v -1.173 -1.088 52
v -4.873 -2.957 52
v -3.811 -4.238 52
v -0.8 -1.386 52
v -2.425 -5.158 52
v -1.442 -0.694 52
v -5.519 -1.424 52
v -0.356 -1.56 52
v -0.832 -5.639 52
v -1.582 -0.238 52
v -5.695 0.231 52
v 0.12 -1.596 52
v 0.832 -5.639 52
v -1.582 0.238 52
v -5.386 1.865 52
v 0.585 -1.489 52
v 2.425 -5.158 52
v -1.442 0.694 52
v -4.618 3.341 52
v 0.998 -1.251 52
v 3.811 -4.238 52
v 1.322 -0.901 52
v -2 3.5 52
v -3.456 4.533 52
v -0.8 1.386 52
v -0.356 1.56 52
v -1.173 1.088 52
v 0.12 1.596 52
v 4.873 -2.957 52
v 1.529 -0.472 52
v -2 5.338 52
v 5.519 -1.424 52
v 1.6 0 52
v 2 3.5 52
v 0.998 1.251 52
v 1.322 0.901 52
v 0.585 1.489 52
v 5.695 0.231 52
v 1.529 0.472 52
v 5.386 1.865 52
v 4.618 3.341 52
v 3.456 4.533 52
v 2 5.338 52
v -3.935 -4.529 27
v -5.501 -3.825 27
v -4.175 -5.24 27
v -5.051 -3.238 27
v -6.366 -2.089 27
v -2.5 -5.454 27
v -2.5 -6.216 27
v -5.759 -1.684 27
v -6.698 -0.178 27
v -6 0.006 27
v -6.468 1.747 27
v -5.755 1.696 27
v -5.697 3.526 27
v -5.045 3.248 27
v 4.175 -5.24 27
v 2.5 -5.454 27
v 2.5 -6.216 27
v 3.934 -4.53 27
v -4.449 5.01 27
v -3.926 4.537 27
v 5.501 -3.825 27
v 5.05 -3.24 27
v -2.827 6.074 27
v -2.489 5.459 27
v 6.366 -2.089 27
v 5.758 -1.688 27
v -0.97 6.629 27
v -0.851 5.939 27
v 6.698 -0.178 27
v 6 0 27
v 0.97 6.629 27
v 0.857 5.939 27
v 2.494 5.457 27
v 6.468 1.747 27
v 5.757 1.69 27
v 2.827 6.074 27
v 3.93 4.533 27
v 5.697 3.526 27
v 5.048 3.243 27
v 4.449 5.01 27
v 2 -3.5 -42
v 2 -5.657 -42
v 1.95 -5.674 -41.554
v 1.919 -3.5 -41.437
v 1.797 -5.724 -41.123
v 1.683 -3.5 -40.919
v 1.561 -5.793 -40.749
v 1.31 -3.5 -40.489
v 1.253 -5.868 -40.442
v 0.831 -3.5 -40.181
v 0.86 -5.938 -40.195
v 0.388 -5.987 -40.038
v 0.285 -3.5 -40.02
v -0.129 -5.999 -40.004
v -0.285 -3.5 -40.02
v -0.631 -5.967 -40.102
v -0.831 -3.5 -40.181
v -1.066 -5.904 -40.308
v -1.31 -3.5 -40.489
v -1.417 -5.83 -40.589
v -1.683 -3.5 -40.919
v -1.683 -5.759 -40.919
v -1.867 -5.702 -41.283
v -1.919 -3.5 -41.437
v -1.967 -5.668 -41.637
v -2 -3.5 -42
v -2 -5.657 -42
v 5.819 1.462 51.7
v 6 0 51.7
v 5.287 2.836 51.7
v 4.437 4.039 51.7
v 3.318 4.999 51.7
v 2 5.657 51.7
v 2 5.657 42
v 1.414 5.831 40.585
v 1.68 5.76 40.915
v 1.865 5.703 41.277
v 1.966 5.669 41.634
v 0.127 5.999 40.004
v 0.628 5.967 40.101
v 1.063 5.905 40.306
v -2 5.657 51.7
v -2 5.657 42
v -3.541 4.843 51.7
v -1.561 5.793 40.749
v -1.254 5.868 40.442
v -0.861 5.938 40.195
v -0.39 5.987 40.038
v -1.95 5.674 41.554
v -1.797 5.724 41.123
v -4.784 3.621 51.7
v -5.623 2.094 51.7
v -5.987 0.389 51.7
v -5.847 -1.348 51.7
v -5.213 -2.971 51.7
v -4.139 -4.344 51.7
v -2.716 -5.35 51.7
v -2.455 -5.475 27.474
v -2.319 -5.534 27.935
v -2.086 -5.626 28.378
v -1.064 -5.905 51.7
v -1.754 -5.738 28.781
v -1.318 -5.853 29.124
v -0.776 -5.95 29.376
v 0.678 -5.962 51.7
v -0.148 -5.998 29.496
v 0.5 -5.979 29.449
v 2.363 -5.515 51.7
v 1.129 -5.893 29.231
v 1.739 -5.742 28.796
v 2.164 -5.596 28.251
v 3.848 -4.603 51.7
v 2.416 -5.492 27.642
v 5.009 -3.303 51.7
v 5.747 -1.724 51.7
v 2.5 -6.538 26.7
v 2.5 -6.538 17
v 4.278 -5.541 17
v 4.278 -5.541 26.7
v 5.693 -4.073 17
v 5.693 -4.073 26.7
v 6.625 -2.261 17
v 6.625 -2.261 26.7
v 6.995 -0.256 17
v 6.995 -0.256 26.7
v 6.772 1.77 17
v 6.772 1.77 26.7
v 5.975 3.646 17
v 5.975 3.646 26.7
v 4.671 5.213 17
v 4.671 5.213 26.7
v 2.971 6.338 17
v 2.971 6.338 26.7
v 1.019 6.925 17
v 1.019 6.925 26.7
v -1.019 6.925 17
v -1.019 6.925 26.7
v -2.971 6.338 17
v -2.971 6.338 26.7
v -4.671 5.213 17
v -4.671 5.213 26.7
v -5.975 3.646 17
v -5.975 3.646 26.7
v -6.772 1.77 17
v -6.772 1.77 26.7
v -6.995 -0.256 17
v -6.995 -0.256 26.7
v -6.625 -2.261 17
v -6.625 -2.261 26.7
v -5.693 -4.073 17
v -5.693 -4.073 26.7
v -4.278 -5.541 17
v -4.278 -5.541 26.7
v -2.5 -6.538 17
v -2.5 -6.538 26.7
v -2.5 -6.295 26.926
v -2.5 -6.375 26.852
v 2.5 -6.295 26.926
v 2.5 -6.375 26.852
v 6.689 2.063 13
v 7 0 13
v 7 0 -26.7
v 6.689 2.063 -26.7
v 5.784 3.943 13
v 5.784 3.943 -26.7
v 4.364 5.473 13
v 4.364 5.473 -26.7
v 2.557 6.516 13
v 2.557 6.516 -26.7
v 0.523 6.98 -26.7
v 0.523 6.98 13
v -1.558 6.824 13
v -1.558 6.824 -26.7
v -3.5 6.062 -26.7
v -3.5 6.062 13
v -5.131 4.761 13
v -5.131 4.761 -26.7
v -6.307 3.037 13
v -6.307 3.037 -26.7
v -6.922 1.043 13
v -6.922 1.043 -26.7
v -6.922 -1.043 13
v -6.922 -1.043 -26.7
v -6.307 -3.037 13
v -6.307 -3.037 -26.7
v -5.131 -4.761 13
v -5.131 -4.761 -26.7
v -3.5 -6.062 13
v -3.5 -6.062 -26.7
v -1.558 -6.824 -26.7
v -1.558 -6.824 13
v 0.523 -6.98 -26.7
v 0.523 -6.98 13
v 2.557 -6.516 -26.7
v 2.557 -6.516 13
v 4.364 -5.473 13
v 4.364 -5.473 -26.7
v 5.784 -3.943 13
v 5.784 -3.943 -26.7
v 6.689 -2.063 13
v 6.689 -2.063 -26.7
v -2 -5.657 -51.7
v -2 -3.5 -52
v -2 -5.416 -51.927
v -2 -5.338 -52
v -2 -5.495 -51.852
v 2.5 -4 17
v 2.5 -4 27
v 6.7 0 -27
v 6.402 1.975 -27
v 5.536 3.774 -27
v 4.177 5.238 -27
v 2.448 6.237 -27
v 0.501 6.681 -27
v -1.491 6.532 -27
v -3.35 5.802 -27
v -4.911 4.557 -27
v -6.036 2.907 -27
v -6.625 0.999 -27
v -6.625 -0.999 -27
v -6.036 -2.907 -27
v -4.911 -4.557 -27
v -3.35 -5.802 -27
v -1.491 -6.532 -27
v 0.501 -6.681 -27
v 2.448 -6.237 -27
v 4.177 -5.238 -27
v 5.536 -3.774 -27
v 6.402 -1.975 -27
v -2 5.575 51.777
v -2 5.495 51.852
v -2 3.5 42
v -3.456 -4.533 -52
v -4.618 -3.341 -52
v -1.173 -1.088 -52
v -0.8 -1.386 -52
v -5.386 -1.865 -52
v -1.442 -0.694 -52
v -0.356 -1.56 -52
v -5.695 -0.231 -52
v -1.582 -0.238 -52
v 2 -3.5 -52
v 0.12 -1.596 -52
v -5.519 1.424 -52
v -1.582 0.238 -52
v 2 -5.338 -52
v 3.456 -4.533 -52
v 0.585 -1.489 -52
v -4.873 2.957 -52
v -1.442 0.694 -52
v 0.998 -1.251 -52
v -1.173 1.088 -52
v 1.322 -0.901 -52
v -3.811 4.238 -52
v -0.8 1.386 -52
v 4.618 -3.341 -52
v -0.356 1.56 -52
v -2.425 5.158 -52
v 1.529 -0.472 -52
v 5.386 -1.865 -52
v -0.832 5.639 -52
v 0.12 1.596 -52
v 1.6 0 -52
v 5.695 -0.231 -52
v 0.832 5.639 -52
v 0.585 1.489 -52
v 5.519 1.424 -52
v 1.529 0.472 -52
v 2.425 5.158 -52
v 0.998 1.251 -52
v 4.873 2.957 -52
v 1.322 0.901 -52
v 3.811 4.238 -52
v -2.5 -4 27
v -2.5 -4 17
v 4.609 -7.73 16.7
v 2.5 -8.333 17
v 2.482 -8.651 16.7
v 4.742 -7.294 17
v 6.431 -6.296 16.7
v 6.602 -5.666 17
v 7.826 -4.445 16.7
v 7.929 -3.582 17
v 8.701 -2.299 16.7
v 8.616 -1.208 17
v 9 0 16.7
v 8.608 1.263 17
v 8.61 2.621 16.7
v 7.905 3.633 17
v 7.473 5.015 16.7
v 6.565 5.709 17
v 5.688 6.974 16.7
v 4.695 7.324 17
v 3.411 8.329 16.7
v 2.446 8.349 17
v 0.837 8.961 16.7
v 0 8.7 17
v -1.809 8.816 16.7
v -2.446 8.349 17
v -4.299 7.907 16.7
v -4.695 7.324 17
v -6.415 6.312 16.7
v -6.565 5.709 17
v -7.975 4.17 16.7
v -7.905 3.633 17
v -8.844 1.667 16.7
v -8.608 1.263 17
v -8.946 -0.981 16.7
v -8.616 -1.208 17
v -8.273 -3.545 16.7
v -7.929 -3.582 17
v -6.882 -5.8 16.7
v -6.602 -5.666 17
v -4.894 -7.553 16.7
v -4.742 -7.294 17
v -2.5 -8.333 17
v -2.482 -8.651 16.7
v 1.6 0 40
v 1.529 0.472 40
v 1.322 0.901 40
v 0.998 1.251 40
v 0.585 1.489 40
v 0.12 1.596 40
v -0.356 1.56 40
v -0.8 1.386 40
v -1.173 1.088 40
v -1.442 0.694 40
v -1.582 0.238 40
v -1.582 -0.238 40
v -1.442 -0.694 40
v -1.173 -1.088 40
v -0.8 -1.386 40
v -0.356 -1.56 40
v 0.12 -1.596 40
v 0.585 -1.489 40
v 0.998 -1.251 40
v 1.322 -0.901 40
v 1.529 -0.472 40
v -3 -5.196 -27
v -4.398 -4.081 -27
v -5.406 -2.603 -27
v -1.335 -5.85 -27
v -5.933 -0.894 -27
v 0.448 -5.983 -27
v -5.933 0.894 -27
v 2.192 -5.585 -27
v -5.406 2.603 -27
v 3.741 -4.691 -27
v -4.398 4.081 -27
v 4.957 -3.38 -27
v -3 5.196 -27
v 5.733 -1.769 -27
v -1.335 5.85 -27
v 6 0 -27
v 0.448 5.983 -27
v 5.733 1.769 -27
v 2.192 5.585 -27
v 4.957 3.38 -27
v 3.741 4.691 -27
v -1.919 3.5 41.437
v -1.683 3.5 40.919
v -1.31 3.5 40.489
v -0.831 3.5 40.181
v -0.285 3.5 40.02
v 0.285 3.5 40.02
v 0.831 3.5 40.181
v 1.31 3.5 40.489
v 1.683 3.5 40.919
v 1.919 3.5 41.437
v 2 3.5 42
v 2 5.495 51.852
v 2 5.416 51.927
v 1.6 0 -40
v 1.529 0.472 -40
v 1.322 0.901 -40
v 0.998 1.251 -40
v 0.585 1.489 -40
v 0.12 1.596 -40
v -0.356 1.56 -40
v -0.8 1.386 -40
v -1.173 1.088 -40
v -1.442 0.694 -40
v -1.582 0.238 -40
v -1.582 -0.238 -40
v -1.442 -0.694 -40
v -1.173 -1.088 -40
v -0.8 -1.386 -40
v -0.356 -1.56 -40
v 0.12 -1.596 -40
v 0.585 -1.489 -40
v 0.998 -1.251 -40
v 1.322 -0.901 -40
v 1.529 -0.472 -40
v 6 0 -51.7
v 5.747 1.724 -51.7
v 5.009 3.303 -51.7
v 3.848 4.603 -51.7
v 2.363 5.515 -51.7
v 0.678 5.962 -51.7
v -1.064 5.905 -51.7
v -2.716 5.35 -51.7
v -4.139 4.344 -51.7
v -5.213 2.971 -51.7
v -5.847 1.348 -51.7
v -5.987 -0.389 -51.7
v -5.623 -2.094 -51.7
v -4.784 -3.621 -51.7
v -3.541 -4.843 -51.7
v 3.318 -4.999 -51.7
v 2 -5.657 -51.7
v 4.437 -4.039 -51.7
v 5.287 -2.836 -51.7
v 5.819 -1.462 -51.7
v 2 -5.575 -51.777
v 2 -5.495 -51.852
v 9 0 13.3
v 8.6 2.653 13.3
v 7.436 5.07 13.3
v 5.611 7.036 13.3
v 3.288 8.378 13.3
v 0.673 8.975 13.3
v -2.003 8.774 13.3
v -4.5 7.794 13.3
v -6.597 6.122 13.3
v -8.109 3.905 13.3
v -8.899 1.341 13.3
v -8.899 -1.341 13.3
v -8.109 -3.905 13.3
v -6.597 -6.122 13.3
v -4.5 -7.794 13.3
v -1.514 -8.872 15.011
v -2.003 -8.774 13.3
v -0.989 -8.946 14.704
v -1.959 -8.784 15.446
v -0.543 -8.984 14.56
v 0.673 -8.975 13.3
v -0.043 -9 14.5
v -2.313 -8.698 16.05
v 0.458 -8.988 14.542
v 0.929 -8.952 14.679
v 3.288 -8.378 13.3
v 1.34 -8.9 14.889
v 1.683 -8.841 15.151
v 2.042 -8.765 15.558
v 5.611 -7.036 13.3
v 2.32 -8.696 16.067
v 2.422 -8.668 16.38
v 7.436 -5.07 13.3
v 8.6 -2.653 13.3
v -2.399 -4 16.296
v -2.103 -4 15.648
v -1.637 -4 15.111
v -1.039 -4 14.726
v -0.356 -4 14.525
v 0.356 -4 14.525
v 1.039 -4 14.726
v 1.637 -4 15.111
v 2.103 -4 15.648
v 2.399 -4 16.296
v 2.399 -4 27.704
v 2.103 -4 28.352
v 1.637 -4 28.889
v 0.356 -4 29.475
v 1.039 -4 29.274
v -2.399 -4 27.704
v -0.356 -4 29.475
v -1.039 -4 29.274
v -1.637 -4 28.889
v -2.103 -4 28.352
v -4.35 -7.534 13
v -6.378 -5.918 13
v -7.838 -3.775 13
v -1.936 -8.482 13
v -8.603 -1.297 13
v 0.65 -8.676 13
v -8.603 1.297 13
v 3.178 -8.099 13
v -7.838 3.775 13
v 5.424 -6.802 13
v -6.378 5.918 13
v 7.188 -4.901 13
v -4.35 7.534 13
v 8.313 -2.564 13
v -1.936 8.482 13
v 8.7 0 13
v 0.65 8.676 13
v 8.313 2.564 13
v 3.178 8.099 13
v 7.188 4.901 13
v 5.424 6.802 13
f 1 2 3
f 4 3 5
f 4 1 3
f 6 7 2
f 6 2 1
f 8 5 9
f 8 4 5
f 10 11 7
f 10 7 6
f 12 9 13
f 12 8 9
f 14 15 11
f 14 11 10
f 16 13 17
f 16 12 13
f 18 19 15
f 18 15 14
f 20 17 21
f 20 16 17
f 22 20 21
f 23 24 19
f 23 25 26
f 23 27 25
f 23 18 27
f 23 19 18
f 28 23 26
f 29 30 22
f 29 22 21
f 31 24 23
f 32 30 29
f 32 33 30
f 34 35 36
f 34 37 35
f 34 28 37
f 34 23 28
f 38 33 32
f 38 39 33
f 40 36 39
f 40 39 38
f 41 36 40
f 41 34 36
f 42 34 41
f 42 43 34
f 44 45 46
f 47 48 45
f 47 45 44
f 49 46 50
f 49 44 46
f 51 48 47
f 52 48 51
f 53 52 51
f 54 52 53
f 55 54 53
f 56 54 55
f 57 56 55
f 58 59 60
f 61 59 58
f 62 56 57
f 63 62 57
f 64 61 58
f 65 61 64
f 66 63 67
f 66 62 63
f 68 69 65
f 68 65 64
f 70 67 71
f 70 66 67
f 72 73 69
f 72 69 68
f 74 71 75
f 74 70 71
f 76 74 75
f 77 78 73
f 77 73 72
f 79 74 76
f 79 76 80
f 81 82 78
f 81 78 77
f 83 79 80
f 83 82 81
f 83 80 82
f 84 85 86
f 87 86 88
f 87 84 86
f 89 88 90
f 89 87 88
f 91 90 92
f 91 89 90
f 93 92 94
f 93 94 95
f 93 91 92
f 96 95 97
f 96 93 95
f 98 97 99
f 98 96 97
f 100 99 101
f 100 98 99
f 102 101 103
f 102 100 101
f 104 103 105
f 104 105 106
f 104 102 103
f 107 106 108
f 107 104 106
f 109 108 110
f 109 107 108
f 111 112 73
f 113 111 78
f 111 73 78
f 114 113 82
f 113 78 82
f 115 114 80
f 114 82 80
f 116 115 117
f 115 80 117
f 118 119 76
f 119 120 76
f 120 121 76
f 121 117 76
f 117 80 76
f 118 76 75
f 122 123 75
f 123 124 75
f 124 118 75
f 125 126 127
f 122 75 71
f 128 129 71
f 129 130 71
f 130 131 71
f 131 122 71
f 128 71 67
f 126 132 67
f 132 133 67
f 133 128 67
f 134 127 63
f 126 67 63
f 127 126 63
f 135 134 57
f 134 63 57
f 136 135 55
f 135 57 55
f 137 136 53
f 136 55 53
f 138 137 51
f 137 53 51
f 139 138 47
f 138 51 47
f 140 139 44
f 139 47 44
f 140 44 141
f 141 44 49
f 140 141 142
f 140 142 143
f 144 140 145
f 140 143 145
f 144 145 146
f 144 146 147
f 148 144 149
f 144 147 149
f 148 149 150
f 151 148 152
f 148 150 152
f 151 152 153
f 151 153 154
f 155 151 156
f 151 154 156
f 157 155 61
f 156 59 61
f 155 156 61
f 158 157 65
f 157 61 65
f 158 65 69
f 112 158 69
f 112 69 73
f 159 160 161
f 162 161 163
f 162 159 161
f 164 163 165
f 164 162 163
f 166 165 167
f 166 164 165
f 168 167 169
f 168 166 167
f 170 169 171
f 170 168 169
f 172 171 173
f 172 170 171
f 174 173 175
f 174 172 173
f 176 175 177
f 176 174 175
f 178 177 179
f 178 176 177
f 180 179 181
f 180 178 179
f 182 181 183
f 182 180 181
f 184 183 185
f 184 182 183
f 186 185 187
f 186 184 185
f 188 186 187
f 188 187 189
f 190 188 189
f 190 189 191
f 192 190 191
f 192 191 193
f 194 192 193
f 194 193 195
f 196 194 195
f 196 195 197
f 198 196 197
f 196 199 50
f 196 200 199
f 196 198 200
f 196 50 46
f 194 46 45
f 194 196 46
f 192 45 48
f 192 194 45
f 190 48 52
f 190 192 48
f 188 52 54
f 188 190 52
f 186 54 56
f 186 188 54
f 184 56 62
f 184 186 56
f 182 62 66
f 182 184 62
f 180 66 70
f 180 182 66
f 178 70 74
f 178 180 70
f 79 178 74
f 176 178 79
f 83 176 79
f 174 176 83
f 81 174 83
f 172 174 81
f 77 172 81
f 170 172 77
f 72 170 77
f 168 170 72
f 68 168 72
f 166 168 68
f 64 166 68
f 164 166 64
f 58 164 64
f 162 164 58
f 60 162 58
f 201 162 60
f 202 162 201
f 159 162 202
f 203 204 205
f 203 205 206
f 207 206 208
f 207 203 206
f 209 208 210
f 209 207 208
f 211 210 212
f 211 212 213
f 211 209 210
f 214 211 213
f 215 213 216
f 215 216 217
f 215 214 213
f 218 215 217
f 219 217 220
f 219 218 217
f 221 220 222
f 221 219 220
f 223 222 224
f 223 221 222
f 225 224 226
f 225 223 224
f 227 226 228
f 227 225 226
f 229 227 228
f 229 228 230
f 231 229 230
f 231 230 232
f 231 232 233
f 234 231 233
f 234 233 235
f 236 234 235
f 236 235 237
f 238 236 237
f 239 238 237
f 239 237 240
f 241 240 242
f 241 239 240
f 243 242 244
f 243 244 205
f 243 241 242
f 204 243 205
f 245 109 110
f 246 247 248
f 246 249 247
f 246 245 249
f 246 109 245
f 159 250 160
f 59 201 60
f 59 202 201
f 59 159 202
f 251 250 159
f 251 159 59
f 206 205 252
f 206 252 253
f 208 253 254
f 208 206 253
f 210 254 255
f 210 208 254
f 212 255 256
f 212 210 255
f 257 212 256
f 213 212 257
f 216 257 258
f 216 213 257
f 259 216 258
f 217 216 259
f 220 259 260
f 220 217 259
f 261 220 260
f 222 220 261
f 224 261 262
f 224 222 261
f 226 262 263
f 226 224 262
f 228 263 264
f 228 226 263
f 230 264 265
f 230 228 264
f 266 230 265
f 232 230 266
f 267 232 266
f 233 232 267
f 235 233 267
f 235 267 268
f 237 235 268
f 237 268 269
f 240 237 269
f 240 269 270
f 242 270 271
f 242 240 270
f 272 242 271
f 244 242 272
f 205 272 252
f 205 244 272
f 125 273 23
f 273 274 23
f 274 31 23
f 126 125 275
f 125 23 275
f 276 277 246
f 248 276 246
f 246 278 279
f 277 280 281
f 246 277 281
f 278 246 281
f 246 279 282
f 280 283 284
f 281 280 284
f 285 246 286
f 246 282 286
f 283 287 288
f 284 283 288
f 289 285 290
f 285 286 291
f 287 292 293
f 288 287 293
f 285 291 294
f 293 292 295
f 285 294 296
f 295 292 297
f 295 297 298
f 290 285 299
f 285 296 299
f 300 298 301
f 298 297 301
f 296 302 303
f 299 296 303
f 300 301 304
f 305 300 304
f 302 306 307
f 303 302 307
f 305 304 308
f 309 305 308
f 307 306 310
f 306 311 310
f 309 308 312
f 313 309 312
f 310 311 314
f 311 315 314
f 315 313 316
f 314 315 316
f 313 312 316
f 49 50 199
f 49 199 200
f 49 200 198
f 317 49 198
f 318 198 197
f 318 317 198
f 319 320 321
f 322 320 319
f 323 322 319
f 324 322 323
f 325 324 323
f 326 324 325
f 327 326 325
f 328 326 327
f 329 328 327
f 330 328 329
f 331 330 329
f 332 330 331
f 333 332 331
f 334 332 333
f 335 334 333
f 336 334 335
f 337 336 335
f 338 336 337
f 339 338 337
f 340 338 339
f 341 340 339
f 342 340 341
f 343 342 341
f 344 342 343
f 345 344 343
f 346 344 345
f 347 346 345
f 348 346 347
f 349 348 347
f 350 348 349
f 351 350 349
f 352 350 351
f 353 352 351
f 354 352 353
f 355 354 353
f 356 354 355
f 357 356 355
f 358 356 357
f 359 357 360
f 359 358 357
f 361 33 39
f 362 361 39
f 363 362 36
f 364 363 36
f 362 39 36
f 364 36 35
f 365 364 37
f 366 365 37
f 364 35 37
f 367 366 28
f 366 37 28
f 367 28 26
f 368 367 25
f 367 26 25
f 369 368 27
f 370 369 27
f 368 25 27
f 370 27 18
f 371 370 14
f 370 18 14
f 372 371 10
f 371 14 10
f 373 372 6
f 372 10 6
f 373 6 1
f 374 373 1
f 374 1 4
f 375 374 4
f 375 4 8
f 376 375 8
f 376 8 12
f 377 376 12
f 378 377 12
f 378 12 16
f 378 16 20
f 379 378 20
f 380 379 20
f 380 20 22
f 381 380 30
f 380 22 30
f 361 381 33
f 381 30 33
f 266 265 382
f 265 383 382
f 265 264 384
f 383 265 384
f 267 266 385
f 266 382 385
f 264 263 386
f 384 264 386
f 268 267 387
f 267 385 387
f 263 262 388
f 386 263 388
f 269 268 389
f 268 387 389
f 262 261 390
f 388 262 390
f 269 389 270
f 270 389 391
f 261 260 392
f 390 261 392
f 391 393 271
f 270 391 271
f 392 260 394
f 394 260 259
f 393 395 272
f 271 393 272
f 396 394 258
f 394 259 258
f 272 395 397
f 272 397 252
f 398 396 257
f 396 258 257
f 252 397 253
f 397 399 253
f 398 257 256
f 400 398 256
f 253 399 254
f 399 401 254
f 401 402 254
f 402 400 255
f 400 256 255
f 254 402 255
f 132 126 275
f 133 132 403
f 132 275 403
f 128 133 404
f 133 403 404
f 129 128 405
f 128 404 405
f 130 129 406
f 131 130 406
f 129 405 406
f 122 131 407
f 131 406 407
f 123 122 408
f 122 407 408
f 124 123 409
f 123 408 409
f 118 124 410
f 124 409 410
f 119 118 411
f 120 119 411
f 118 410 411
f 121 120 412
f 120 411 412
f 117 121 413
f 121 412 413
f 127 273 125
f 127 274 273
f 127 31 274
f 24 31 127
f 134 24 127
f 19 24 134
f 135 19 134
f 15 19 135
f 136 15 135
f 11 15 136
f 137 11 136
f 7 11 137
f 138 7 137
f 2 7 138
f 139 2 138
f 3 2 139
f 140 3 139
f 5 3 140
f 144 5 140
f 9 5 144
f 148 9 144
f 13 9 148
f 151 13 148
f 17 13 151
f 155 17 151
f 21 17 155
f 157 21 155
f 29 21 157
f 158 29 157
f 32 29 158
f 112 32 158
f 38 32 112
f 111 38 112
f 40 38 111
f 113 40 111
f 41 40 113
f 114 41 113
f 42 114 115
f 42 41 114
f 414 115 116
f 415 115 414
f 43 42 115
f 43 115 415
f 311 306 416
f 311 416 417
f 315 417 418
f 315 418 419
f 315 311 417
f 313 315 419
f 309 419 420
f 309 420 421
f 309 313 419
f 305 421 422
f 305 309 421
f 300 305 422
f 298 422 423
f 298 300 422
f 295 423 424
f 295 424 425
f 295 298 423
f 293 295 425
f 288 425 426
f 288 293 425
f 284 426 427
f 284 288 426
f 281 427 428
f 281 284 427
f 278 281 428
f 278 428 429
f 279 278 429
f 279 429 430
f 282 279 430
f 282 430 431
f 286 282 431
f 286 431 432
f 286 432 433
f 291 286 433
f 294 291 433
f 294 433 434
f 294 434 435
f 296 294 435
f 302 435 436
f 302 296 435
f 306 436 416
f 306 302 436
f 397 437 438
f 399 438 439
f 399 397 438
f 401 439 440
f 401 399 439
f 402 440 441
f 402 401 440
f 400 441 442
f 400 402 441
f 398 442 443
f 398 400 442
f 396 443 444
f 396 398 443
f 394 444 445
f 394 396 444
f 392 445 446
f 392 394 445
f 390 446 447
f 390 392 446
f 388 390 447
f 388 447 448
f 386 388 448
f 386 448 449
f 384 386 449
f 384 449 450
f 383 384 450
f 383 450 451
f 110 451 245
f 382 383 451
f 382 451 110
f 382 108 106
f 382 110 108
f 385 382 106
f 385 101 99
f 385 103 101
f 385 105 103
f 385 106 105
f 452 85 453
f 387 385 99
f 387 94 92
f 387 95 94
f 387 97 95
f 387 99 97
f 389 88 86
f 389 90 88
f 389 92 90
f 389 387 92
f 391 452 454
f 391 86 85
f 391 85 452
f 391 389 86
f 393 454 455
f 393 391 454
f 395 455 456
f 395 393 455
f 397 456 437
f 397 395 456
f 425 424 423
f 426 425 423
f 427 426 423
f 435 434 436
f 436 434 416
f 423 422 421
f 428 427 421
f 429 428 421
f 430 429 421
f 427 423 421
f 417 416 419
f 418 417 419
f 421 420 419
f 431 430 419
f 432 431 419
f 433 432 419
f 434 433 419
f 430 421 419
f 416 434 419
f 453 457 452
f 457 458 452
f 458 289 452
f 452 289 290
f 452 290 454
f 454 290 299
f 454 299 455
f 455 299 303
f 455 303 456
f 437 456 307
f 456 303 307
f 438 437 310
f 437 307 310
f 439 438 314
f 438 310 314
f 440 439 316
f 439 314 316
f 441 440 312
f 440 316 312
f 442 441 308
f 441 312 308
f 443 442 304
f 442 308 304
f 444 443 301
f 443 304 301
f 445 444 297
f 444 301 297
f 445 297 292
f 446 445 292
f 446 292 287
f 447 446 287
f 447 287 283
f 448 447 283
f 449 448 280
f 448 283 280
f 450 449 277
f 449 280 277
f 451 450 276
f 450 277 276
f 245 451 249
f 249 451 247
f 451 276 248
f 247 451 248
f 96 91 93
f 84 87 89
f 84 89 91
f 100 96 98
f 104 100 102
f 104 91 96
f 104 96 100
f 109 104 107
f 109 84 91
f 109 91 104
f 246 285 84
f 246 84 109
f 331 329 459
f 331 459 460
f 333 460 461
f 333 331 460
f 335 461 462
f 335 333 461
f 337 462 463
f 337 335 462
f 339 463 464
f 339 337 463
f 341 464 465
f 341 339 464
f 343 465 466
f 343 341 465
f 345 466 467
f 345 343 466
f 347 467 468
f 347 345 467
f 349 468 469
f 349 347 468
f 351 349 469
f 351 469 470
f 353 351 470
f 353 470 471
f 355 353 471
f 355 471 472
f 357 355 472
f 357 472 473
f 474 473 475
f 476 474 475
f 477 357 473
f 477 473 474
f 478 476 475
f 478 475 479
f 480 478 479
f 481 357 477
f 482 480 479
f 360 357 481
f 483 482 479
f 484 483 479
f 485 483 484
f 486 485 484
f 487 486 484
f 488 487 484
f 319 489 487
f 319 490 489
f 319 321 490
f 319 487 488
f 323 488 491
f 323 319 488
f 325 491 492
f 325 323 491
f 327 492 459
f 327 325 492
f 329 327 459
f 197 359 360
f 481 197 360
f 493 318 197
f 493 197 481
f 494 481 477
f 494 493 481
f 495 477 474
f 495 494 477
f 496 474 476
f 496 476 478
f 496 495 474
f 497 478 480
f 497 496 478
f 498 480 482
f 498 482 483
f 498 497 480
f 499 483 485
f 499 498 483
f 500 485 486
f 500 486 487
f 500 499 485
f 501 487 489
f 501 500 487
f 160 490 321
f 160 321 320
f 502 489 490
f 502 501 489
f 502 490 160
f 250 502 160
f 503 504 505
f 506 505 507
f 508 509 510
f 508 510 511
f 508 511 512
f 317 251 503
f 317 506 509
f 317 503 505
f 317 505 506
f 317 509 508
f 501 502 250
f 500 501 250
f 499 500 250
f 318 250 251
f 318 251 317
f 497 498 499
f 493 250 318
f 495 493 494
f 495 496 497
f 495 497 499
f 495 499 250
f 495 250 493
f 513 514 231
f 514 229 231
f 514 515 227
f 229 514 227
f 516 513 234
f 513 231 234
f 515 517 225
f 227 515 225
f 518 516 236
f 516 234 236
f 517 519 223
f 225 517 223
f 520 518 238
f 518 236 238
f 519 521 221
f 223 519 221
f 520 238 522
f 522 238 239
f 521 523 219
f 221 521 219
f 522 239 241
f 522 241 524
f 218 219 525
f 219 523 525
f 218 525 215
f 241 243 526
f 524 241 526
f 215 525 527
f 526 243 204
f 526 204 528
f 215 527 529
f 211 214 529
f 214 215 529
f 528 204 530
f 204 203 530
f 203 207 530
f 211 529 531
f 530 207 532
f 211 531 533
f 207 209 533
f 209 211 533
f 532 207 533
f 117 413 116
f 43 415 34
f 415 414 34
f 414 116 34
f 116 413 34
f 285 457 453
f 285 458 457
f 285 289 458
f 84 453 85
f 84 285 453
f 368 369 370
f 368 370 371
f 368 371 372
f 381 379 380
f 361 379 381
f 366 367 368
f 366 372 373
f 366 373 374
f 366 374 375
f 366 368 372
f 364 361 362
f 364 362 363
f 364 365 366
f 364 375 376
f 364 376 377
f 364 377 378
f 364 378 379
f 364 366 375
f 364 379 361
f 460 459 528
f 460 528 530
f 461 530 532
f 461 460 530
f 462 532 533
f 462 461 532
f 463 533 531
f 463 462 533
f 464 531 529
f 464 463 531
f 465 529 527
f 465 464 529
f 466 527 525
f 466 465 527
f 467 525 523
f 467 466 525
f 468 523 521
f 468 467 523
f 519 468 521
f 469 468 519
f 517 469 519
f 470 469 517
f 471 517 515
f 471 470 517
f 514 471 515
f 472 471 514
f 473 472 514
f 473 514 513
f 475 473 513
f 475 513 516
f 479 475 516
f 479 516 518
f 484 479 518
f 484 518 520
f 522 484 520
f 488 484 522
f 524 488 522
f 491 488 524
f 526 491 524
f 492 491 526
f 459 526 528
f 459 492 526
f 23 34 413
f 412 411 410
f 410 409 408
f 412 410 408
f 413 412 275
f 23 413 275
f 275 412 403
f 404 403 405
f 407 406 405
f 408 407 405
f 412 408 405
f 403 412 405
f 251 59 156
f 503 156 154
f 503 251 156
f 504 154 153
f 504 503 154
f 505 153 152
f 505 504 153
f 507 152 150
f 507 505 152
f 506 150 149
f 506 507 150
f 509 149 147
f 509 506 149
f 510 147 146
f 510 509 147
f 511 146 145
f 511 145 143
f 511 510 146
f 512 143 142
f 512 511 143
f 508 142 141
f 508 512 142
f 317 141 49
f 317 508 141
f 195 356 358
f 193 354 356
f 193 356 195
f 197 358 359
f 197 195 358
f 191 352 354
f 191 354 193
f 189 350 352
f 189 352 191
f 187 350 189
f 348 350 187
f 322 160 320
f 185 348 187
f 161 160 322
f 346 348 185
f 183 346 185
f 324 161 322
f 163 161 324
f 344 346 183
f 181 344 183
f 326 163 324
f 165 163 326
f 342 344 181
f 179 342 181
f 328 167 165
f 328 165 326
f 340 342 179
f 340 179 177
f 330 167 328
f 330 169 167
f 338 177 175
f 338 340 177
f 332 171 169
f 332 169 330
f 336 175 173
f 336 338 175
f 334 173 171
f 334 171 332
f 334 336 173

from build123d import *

# Parameters (mm, degrees)
SKETCH1_R      = 7
EXTRUDE1_DEPTH = 37
EXTRUDE5_START = -20
SKETCH5_R      = 9
EXTRUDE5_DEPTH = 4
EXTRUDE3_START = -4
EXTRUDE3_DEPTH = 36.127995093
SKETCH4_R      = 7
SKETCH4_R_2    = 6
EXTRUDE4_DEPTH = 10
SKETCH6_R      = 6
EXTRUDE6_DEPTH = 15
CHAMFER1_SIZE  = 0.3
SKETCH7_R      = 1.6
EXTRUDE7_DEPTH = 12
EXTRUDE8_START = -3.5
EXTRUDE8_DEPTH = 12
EXTRUDE9_START = 3.5
EXTRUDE9_DEPTH = 51.035035296


with BuildPart() as part:
    # Sketch1 → Extrude1 (new, symmetric)
    with BuildSketch(Plane.XY):
        Circle(SKETCH1_R)
    extrude(amount=EXTRUDE1_DEPTH, both=True)

    # Sketch5 → Extrude5 (add)
    with BuildSketch(Plane.XY.offset(37).offset(EXTRUDE5_START)):
        Circle(SKETCH5_R)
    extrude(amount=-EXTRUDE5_DEPTH)

    # Sketch3 → Extrude3 (cut, through all)
    with BuildSketch(Plane(origin=(0, 0, 0), x_dir=(1, 0, 0), z_dir=(0, 1, 0)).offset(EXTRUDE3_START)):
        with BuildLine():
            Line((-2.5, -27), (-2.5, -17))
            ThreePointArc((-2.5, -17), (0, -14.5), (2.5, -17))
            Line((2.5, -17), (2.5, -27))
            ThreePointArc((2.5, -27), (0, -29.5), (-2.5, -27))
        make_face()
    extrude(amount=-EXTRUDE3_DEPTH, mode=Mode.SUBTRACT)

    # Sketch4 → Extrude4 (cut)
    with BuildSketch(Plane.XY.offset(37)):
        Circle(SKETCH4_R)
        Circle(SKETCH4_R_2, mode=Mode.SUBTRACT)
    extrude4 = extrude(amount=-EXTRUDE4_DEPTH, mode=Mode.SUBTRACT)

    # Mirror1: Extrude4 across plane
    add(extrude4.mirror(Plane.XY), mode=Mode.SUBTRACT)

    # Sketch6 → Extrude6 (add)
    with BuildSketch(Plane.XY.offset(37)):
        Circle(SKETCH6_R)
    extrude6 = extrude(amount=EXTRUDE6_DEPTH)

    # Mirror2: Extrude6 across plane
    add(extrude6.mirror(Plane.XY))

    # Chamfer1
    chamfer1_edges = [part.edges().sort_by_distance(p)[0] for p in [
        (-6, 0, 52),
        (-6, 0, -52),
        (-7, 0, -27),
        (-9, 0, 13),
        (-5.408326913, 7.193747285, 17),
        (0, 7, 27),
    ]]
    chamfer(chamfer1_edges, length=CHAMFER1_SIZE)

    # Sketch7 → Extrude7 (cut)
    with BuildSketch(Plane.XY.offset(52)):
        Circle(SKETCH7_R)
    extrude7 = extrude(amount=-EXTRUDE7_DEPTH, mode=Mode.SUBTRACT)

    # Mirror3: Extrude7 across plane
    add(extrude7.mirror(Plane.XY), mode=Mode.SUBTRACT)

    # Sketch8 → Extrude8 (cut)
    with BuildSketch(Plane(origin=(0, 0, 0), x_dir=(1, 0, 0), z_dir=(0, 1, 0)).offset(EXTRUDE8_START)):
        with BuildLine():
            Line((2, 52), (2, 42))
            ThreePointArc((2, 42), (0, 40), (-2, 42))
            Line((-2, 42), (-2, 52))
            ThreePointArc((-2, 52), (0, 54), (2, 52))
        make_face()
    extrude(amount=-EXTRUDE8_DEPTH, mode=Mode.SUBTRACT)

    # Sketch9 → Extrude9 (cut, through all)
    with BuildSketch(Plane(origin=(0, 0, 0), x_dir=(1, 0, 0), z_dir=(0, 1, 0)).offset(EXTRUDE9_START)):
        with BuildLine():
            Line((-2, -52), (-2, -42))
            ThreePointArc((-2, -42), (0, -40), (2, -42))
            Line((2, -42), (2, -52))
            ThreePointArc((2, -52), (0, -54), (-2, -52))
        make_face()
    extrude(amount=EXTRUDE9_DEPTH, mode=Mode.SUBTRACT)


solid = part.part
